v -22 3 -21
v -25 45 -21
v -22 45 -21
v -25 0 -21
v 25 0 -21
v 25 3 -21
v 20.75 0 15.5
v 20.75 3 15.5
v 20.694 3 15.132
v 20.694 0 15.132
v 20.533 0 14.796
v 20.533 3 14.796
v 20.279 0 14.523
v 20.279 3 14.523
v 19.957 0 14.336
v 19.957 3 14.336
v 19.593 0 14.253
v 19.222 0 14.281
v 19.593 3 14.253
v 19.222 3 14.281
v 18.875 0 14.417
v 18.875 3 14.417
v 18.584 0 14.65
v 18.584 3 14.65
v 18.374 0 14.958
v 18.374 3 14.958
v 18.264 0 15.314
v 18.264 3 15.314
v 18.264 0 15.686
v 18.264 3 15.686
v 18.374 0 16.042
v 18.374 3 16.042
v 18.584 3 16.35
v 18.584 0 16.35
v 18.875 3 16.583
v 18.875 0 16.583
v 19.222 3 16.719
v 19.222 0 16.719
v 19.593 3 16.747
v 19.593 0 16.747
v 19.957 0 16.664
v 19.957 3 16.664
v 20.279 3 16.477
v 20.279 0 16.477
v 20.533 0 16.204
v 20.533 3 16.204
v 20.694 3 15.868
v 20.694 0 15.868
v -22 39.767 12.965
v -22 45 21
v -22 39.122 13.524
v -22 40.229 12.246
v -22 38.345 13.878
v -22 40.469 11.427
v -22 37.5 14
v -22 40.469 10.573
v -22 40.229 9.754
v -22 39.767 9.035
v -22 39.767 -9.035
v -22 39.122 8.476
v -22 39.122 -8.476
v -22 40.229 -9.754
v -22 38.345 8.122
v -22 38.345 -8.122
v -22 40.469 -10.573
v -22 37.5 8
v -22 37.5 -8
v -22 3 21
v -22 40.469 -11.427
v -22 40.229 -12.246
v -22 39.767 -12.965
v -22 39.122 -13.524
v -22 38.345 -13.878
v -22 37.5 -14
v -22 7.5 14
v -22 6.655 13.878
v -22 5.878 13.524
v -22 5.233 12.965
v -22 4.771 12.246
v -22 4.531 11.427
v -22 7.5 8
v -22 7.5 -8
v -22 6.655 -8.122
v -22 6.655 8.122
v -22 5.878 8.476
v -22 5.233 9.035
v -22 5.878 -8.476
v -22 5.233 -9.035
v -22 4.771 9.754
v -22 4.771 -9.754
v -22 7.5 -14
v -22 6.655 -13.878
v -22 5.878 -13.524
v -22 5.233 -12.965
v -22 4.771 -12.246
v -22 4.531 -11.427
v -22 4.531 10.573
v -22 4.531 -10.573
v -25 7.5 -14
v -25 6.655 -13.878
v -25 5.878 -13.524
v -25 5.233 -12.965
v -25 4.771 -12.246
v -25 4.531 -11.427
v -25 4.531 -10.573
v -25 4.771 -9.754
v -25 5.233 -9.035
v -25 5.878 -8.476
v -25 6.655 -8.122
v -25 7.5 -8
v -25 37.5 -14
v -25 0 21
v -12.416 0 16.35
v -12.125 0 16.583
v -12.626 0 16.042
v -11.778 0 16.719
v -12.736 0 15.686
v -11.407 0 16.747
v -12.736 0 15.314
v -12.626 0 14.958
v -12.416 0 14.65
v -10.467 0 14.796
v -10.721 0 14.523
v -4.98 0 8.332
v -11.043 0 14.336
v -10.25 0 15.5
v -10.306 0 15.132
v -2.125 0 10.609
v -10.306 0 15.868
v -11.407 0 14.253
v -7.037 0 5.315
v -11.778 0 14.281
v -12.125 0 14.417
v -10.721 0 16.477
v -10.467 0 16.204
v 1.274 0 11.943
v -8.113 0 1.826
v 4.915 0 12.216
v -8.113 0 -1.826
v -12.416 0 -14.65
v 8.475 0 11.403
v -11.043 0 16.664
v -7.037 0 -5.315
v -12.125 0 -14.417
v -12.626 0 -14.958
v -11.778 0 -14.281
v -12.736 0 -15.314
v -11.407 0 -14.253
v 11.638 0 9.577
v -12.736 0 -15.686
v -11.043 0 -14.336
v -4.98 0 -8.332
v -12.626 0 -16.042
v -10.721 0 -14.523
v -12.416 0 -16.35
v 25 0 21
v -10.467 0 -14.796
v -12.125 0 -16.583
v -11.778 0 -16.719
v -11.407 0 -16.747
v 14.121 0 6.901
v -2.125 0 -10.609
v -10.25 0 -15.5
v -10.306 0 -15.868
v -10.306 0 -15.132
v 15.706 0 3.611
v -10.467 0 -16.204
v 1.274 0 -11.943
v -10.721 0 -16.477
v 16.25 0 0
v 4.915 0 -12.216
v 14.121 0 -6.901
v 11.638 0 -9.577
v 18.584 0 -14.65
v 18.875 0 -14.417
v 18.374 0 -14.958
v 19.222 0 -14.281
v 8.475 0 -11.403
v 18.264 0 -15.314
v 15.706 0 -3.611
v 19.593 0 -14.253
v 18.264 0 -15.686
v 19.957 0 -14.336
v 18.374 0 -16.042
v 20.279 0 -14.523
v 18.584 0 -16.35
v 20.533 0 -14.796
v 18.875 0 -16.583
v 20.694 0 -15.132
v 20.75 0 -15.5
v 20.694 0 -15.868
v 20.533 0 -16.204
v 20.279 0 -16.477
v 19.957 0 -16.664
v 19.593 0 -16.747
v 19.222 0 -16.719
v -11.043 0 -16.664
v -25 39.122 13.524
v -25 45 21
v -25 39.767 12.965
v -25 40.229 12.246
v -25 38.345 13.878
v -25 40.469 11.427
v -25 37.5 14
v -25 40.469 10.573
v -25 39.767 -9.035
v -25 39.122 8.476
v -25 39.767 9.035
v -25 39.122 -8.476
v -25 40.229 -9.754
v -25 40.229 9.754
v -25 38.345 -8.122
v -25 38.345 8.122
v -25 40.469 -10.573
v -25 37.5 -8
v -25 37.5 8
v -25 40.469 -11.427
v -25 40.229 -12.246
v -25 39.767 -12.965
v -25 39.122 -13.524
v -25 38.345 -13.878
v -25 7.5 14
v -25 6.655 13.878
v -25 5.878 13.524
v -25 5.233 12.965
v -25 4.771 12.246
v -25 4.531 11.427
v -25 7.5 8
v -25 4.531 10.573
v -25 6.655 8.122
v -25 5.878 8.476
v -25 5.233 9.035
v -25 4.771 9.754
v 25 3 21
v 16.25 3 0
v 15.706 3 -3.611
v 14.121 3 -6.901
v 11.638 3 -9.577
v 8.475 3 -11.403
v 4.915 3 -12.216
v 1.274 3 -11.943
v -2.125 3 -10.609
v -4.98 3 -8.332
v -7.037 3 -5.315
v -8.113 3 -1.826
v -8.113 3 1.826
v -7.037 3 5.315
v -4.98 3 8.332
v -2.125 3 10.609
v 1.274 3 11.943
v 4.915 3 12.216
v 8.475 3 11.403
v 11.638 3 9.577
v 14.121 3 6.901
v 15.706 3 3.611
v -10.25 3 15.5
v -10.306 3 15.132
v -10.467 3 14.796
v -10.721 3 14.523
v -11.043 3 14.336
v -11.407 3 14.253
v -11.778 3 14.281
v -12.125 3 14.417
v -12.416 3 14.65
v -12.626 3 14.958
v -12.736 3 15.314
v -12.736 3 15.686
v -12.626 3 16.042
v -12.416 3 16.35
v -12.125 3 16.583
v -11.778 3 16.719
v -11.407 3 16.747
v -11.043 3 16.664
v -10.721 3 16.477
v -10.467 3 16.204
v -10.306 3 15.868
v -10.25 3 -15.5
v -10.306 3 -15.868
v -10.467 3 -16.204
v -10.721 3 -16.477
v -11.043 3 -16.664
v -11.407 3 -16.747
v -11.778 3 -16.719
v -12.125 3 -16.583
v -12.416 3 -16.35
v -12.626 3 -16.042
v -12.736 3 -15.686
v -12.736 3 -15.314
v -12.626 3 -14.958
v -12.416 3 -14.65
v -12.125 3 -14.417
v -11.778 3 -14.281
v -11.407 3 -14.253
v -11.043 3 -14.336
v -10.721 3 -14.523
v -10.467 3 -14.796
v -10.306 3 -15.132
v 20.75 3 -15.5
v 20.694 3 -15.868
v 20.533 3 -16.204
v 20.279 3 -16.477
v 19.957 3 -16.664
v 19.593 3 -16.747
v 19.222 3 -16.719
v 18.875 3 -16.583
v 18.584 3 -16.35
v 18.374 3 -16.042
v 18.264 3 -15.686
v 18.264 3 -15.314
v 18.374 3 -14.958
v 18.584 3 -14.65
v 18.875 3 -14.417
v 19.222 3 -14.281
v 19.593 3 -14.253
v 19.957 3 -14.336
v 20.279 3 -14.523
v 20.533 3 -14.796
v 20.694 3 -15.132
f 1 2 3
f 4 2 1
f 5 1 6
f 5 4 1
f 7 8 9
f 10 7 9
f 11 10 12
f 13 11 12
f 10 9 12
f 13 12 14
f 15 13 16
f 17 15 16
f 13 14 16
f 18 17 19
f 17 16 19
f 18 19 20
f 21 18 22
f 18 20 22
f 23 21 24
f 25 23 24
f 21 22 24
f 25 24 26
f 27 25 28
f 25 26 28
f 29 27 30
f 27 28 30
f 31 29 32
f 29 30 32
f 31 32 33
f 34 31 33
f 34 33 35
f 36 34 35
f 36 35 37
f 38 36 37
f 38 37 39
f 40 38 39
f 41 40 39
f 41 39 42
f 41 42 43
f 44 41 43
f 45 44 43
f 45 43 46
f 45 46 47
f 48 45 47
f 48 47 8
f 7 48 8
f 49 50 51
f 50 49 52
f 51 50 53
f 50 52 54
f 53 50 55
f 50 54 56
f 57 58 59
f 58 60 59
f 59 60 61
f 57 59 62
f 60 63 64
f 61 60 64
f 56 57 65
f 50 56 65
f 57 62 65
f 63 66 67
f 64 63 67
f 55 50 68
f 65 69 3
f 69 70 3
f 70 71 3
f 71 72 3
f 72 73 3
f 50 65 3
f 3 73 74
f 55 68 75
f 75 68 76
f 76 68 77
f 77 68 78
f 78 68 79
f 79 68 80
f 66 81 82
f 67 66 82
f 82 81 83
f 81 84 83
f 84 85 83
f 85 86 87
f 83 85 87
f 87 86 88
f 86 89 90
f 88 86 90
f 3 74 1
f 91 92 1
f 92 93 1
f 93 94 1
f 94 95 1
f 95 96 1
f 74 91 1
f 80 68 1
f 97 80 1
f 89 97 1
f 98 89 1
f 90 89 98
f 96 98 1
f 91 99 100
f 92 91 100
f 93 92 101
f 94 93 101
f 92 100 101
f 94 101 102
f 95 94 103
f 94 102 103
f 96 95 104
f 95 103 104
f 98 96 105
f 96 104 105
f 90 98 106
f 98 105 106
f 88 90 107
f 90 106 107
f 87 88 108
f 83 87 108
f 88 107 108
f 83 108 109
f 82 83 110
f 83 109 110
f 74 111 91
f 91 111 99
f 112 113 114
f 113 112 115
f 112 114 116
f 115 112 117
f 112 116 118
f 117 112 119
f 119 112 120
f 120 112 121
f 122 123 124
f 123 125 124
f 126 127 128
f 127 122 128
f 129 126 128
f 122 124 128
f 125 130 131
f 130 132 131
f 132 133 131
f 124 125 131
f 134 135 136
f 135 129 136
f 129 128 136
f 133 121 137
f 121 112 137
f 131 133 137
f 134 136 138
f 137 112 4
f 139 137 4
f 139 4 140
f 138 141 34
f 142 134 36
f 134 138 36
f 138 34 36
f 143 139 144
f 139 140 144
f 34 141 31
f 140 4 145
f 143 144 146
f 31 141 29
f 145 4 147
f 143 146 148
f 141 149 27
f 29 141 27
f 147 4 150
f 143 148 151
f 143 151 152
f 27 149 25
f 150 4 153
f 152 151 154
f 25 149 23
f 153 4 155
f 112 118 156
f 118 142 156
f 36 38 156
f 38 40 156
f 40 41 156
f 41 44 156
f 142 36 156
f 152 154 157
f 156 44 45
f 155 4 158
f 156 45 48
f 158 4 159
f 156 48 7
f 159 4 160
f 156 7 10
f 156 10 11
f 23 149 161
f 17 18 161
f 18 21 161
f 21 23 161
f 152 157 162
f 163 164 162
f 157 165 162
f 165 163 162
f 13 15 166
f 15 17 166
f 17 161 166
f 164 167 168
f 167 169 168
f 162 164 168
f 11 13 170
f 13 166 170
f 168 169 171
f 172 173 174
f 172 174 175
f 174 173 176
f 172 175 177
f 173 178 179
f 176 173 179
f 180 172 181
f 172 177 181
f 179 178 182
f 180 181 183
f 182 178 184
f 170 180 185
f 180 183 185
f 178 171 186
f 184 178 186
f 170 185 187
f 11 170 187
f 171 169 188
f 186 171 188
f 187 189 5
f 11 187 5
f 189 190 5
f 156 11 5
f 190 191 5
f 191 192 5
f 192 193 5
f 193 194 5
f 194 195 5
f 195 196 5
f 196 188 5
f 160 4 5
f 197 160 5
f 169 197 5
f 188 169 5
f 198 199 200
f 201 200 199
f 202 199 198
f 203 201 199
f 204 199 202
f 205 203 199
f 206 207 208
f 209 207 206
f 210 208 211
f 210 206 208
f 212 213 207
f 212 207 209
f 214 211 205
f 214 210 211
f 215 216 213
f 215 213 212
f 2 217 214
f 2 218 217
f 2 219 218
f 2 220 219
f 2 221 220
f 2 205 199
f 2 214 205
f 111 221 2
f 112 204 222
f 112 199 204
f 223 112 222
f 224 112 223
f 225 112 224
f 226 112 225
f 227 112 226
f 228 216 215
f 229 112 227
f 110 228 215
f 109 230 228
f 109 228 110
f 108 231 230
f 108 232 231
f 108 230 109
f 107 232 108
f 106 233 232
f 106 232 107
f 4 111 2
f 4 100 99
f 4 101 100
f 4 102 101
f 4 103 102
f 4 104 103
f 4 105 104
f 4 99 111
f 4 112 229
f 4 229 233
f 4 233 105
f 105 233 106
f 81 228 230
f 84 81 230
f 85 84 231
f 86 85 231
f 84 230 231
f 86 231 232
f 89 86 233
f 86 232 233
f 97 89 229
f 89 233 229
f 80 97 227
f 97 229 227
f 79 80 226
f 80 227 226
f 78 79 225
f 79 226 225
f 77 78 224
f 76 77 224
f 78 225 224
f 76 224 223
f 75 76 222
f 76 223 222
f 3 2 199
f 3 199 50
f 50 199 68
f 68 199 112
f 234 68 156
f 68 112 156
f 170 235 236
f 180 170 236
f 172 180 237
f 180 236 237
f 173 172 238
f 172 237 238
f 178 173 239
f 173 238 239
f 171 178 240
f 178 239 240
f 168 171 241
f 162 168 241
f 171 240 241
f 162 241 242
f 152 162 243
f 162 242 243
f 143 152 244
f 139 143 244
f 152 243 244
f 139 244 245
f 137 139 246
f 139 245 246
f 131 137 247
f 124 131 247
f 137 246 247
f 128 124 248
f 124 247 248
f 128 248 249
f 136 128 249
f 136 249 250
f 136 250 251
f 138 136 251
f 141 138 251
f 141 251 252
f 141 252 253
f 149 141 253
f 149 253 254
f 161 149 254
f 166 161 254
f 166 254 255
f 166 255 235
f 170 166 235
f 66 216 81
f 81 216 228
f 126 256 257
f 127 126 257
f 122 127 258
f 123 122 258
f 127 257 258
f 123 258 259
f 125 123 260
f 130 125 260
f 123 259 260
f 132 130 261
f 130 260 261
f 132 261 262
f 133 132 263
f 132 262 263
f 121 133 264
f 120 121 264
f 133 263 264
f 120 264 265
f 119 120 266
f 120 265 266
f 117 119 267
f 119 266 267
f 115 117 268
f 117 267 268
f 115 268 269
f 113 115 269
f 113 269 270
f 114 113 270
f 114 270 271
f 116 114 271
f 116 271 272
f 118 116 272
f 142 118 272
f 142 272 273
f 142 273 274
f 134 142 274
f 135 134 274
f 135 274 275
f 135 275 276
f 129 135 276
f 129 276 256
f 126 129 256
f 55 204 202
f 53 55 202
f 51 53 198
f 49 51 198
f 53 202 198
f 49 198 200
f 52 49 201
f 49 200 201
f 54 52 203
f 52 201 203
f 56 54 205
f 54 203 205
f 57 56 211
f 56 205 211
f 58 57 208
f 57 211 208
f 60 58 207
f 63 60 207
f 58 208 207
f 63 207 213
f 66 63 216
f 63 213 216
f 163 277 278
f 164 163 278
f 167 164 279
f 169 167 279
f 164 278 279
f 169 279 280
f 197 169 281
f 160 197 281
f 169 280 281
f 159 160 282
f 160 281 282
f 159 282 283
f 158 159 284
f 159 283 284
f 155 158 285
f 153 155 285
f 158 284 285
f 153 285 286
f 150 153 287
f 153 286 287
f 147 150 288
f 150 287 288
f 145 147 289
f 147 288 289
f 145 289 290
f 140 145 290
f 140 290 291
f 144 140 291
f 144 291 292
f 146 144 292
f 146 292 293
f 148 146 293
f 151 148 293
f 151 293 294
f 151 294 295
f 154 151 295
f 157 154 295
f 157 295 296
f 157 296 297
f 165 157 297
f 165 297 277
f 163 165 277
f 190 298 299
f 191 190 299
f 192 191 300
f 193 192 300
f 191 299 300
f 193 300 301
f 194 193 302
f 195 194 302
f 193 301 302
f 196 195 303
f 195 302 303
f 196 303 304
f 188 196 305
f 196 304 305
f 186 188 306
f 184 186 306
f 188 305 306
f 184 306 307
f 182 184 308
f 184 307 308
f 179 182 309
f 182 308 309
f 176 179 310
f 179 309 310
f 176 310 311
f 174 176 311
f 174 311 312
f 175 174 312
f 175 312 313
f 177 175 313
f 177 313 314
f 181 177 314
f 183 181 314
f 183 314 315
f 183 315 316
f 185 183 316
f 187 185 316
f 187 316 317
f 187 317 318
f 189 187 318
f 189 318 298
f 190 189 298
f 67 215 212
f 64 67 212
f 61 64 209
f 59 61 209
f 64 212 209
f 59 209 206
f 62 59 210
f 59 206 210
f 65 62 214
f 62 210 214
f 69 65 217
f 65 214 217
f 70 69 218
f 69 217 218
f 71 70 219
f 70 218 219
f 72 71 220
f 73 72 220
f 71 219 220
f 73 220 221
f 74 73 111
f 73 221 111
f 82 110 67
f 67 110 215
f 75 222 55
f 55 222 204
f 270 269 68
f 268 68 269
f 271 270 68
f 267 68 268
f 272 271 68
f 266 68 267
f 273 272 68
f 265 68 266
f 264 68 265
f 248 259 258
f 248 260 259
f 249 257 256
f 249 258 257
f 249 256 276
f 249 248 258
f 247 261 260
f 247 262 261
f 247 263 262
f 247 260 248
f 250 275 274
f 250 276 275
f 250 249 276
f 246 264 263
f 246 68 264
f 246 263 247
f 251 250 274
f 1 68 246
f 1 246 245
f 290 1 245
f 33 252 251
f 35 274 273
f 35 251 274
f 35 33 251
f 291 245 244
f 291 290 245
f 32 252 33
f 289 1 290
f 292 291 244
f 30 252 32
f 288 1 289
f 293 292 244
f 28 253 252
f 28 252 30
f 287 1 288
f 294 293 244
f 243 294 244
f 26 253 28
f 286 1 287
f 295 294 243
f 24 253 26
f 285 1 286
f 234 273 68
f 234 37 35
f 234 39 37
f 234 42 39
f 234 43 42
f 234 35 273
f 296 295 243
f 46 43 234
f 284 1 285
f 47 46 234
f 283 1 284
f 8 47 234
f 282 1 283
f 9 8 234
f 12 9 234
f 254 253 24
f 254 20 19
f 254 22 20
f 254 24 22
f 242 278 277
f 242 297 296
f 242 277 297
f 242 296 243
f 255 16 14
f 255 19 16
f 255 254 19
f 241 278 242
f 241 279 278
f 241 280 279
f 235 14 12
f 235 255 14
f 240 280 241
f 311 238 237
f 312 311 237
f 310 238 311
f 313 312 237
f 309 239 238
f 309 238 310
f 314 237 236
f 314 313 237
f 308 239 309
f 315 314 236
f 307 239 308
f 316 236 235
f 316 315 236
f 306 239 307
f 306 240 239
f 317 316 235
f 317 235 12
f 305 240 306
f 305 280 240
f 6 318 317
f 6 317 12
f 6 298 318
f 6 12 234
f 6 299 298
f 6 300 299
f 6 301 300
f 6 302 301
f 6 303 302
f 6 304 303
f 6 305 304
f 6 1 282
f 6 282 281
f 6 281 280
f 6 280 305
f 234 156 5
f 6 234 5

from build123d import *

# Parameters (mm, degrees)
SKETCH1_W           = 50
SKETCH1_H           = 42
BOSS_EXTRUDE1_DEPTH = 3
SKETCH2_W           = 3
SKETCH2_H           = 42
BOSS_EXTRUDE2_DEPTH = 42
CUT_EXTRUDE2_DEPTH  = 10
SKETCH5_R           = 12.25
SKETCH5_R_2         = 1.25
CUT_EXTRUDE3_DEPTH  = 10


with BuildPart() as part:
    # Sketch1 → Boss-Extrude1 (new body)
    with BuildSketch(Plane(origin=(0, 0, 0), x_dir=(1, 0, 0), z_dir=(0, 1, 0))):
        Rectangle(SKETCH1_W, SKETCH1_H)
    extrude(amount=BOSS_EXTRUDE1_DEPTH)

    # Sketch2 → Boss-Extrude2 (add)
    with BuildSketch(Plane(origin=(0, 3, 0), x_dir=(1, 0, 0), z_dir=(0, 1, 0))):
        with Locations((-23.5, 0)):
            Rectangle(SKETCH2_W, SKETCH2_H)
    extrude(amount=BOSS_EXTRUDE2_DEPTH)

    # Sketch4 → Cut-Extrude2 (cut)
    with BuildSketch(Plane.ZY.offset(25)):
        with BuildLine():
            ThreePointArc((-8, 7.5), (-11, 10.5), (-14, 7.5))
            Line((-14, 7.5), (-8, 7.5))
        make_face()
        with BuildLine():
            Line((-8, 7.5), (-14, 7.5))
            ThreePointArc((-14, 7.5), (-11, 4.5), (-8, 7.5))
        make_face()
        with BuildLine():
            Line((-14, 37.5), (-14, 7.5))
            ThreePointArc((-14, 7.5), (-11, 10.5), (-8, 7.5))
            Line((-8, 7.5), (-8, 37.5))
            ThreePointArc((-8, 37.5), (-11, 34.5), (-14, 37.5))
        make_face()
        with BuildLine():
            ThreePointArc((-8, 37.5), (-11, 40.5), (-14, 37.5))
            Line((-14, 37.5), (-8, 37.5))
        make_face()
        with BuildLine():
            Line((-8, 37.5), (-14, 37.5))
            ThreePointArc((-14, 37.5), (-11, 34.5), (-8, 37.5))
        make_face()
        with BuildLine():
            Line((8, 37.5), (8, 7.5))
            ThreePointArc((8, 7.5), (11, 10.5), (14, 7.5))
            Line((14, 7.5), (14, 37.5))
            ThreePointArc((14, 37.5), (11, 34.5), (8, 37.5))
        make_face()
        with BuildLine():
            ThreePointArc((14, 37.5), (11, 40.5), (8, 37.5))
            Line((8, 37.5), (14, 37.5))
        make_face()
        with BuildLine():
            Line((14, 37.5), (8, 37.5))
            ThreePointArc((8, 37.5), (11, 34.5), (14, 37.5))
        make_face()
        with BuildLine():
            ThreePointArc((14, 7.5), (11, 10.5), (8, 7.5))
            Line((8, 7.5), (14, 7.5))
        make_face()
        with BuildLine():
            Line((14, 7.5), (8, 7.5))
            ThreePointArc((8, 7.5), (11, 4.5), (14, 7.5))
        make_face()
    extrude(amount=-CUT_EXTRUDE2_DEPTH, mode=Mode.SUBTRACT)

    # Sketch5 → Cut-Extrude3 (cut)
    with BuildSketch(Plane(origin=(0, 3, 0), x_dir=(1, 0, 0), z_dir=(0, 1, 0))):
        with Locations((4, 0)):
            Circle(SKETCH5_R)
        with Locations((-11.5, -15.5)):
            Circle(SKETCH5_R_2)
        with Locations((19.5, -15.5)):
            Circle(SKETCH5_R_2)
        with Locations((19.5, 15.5)):
            Circle(SKETCH5_R_2)
        with Locations((-11.5, 15.5)):
            Circle(SKETCH5_R_2)
    extrude(amount=-CUT_EXTRUDE3_DEPTH, mode=Mode.SUBTRACT)


solid = part.part
